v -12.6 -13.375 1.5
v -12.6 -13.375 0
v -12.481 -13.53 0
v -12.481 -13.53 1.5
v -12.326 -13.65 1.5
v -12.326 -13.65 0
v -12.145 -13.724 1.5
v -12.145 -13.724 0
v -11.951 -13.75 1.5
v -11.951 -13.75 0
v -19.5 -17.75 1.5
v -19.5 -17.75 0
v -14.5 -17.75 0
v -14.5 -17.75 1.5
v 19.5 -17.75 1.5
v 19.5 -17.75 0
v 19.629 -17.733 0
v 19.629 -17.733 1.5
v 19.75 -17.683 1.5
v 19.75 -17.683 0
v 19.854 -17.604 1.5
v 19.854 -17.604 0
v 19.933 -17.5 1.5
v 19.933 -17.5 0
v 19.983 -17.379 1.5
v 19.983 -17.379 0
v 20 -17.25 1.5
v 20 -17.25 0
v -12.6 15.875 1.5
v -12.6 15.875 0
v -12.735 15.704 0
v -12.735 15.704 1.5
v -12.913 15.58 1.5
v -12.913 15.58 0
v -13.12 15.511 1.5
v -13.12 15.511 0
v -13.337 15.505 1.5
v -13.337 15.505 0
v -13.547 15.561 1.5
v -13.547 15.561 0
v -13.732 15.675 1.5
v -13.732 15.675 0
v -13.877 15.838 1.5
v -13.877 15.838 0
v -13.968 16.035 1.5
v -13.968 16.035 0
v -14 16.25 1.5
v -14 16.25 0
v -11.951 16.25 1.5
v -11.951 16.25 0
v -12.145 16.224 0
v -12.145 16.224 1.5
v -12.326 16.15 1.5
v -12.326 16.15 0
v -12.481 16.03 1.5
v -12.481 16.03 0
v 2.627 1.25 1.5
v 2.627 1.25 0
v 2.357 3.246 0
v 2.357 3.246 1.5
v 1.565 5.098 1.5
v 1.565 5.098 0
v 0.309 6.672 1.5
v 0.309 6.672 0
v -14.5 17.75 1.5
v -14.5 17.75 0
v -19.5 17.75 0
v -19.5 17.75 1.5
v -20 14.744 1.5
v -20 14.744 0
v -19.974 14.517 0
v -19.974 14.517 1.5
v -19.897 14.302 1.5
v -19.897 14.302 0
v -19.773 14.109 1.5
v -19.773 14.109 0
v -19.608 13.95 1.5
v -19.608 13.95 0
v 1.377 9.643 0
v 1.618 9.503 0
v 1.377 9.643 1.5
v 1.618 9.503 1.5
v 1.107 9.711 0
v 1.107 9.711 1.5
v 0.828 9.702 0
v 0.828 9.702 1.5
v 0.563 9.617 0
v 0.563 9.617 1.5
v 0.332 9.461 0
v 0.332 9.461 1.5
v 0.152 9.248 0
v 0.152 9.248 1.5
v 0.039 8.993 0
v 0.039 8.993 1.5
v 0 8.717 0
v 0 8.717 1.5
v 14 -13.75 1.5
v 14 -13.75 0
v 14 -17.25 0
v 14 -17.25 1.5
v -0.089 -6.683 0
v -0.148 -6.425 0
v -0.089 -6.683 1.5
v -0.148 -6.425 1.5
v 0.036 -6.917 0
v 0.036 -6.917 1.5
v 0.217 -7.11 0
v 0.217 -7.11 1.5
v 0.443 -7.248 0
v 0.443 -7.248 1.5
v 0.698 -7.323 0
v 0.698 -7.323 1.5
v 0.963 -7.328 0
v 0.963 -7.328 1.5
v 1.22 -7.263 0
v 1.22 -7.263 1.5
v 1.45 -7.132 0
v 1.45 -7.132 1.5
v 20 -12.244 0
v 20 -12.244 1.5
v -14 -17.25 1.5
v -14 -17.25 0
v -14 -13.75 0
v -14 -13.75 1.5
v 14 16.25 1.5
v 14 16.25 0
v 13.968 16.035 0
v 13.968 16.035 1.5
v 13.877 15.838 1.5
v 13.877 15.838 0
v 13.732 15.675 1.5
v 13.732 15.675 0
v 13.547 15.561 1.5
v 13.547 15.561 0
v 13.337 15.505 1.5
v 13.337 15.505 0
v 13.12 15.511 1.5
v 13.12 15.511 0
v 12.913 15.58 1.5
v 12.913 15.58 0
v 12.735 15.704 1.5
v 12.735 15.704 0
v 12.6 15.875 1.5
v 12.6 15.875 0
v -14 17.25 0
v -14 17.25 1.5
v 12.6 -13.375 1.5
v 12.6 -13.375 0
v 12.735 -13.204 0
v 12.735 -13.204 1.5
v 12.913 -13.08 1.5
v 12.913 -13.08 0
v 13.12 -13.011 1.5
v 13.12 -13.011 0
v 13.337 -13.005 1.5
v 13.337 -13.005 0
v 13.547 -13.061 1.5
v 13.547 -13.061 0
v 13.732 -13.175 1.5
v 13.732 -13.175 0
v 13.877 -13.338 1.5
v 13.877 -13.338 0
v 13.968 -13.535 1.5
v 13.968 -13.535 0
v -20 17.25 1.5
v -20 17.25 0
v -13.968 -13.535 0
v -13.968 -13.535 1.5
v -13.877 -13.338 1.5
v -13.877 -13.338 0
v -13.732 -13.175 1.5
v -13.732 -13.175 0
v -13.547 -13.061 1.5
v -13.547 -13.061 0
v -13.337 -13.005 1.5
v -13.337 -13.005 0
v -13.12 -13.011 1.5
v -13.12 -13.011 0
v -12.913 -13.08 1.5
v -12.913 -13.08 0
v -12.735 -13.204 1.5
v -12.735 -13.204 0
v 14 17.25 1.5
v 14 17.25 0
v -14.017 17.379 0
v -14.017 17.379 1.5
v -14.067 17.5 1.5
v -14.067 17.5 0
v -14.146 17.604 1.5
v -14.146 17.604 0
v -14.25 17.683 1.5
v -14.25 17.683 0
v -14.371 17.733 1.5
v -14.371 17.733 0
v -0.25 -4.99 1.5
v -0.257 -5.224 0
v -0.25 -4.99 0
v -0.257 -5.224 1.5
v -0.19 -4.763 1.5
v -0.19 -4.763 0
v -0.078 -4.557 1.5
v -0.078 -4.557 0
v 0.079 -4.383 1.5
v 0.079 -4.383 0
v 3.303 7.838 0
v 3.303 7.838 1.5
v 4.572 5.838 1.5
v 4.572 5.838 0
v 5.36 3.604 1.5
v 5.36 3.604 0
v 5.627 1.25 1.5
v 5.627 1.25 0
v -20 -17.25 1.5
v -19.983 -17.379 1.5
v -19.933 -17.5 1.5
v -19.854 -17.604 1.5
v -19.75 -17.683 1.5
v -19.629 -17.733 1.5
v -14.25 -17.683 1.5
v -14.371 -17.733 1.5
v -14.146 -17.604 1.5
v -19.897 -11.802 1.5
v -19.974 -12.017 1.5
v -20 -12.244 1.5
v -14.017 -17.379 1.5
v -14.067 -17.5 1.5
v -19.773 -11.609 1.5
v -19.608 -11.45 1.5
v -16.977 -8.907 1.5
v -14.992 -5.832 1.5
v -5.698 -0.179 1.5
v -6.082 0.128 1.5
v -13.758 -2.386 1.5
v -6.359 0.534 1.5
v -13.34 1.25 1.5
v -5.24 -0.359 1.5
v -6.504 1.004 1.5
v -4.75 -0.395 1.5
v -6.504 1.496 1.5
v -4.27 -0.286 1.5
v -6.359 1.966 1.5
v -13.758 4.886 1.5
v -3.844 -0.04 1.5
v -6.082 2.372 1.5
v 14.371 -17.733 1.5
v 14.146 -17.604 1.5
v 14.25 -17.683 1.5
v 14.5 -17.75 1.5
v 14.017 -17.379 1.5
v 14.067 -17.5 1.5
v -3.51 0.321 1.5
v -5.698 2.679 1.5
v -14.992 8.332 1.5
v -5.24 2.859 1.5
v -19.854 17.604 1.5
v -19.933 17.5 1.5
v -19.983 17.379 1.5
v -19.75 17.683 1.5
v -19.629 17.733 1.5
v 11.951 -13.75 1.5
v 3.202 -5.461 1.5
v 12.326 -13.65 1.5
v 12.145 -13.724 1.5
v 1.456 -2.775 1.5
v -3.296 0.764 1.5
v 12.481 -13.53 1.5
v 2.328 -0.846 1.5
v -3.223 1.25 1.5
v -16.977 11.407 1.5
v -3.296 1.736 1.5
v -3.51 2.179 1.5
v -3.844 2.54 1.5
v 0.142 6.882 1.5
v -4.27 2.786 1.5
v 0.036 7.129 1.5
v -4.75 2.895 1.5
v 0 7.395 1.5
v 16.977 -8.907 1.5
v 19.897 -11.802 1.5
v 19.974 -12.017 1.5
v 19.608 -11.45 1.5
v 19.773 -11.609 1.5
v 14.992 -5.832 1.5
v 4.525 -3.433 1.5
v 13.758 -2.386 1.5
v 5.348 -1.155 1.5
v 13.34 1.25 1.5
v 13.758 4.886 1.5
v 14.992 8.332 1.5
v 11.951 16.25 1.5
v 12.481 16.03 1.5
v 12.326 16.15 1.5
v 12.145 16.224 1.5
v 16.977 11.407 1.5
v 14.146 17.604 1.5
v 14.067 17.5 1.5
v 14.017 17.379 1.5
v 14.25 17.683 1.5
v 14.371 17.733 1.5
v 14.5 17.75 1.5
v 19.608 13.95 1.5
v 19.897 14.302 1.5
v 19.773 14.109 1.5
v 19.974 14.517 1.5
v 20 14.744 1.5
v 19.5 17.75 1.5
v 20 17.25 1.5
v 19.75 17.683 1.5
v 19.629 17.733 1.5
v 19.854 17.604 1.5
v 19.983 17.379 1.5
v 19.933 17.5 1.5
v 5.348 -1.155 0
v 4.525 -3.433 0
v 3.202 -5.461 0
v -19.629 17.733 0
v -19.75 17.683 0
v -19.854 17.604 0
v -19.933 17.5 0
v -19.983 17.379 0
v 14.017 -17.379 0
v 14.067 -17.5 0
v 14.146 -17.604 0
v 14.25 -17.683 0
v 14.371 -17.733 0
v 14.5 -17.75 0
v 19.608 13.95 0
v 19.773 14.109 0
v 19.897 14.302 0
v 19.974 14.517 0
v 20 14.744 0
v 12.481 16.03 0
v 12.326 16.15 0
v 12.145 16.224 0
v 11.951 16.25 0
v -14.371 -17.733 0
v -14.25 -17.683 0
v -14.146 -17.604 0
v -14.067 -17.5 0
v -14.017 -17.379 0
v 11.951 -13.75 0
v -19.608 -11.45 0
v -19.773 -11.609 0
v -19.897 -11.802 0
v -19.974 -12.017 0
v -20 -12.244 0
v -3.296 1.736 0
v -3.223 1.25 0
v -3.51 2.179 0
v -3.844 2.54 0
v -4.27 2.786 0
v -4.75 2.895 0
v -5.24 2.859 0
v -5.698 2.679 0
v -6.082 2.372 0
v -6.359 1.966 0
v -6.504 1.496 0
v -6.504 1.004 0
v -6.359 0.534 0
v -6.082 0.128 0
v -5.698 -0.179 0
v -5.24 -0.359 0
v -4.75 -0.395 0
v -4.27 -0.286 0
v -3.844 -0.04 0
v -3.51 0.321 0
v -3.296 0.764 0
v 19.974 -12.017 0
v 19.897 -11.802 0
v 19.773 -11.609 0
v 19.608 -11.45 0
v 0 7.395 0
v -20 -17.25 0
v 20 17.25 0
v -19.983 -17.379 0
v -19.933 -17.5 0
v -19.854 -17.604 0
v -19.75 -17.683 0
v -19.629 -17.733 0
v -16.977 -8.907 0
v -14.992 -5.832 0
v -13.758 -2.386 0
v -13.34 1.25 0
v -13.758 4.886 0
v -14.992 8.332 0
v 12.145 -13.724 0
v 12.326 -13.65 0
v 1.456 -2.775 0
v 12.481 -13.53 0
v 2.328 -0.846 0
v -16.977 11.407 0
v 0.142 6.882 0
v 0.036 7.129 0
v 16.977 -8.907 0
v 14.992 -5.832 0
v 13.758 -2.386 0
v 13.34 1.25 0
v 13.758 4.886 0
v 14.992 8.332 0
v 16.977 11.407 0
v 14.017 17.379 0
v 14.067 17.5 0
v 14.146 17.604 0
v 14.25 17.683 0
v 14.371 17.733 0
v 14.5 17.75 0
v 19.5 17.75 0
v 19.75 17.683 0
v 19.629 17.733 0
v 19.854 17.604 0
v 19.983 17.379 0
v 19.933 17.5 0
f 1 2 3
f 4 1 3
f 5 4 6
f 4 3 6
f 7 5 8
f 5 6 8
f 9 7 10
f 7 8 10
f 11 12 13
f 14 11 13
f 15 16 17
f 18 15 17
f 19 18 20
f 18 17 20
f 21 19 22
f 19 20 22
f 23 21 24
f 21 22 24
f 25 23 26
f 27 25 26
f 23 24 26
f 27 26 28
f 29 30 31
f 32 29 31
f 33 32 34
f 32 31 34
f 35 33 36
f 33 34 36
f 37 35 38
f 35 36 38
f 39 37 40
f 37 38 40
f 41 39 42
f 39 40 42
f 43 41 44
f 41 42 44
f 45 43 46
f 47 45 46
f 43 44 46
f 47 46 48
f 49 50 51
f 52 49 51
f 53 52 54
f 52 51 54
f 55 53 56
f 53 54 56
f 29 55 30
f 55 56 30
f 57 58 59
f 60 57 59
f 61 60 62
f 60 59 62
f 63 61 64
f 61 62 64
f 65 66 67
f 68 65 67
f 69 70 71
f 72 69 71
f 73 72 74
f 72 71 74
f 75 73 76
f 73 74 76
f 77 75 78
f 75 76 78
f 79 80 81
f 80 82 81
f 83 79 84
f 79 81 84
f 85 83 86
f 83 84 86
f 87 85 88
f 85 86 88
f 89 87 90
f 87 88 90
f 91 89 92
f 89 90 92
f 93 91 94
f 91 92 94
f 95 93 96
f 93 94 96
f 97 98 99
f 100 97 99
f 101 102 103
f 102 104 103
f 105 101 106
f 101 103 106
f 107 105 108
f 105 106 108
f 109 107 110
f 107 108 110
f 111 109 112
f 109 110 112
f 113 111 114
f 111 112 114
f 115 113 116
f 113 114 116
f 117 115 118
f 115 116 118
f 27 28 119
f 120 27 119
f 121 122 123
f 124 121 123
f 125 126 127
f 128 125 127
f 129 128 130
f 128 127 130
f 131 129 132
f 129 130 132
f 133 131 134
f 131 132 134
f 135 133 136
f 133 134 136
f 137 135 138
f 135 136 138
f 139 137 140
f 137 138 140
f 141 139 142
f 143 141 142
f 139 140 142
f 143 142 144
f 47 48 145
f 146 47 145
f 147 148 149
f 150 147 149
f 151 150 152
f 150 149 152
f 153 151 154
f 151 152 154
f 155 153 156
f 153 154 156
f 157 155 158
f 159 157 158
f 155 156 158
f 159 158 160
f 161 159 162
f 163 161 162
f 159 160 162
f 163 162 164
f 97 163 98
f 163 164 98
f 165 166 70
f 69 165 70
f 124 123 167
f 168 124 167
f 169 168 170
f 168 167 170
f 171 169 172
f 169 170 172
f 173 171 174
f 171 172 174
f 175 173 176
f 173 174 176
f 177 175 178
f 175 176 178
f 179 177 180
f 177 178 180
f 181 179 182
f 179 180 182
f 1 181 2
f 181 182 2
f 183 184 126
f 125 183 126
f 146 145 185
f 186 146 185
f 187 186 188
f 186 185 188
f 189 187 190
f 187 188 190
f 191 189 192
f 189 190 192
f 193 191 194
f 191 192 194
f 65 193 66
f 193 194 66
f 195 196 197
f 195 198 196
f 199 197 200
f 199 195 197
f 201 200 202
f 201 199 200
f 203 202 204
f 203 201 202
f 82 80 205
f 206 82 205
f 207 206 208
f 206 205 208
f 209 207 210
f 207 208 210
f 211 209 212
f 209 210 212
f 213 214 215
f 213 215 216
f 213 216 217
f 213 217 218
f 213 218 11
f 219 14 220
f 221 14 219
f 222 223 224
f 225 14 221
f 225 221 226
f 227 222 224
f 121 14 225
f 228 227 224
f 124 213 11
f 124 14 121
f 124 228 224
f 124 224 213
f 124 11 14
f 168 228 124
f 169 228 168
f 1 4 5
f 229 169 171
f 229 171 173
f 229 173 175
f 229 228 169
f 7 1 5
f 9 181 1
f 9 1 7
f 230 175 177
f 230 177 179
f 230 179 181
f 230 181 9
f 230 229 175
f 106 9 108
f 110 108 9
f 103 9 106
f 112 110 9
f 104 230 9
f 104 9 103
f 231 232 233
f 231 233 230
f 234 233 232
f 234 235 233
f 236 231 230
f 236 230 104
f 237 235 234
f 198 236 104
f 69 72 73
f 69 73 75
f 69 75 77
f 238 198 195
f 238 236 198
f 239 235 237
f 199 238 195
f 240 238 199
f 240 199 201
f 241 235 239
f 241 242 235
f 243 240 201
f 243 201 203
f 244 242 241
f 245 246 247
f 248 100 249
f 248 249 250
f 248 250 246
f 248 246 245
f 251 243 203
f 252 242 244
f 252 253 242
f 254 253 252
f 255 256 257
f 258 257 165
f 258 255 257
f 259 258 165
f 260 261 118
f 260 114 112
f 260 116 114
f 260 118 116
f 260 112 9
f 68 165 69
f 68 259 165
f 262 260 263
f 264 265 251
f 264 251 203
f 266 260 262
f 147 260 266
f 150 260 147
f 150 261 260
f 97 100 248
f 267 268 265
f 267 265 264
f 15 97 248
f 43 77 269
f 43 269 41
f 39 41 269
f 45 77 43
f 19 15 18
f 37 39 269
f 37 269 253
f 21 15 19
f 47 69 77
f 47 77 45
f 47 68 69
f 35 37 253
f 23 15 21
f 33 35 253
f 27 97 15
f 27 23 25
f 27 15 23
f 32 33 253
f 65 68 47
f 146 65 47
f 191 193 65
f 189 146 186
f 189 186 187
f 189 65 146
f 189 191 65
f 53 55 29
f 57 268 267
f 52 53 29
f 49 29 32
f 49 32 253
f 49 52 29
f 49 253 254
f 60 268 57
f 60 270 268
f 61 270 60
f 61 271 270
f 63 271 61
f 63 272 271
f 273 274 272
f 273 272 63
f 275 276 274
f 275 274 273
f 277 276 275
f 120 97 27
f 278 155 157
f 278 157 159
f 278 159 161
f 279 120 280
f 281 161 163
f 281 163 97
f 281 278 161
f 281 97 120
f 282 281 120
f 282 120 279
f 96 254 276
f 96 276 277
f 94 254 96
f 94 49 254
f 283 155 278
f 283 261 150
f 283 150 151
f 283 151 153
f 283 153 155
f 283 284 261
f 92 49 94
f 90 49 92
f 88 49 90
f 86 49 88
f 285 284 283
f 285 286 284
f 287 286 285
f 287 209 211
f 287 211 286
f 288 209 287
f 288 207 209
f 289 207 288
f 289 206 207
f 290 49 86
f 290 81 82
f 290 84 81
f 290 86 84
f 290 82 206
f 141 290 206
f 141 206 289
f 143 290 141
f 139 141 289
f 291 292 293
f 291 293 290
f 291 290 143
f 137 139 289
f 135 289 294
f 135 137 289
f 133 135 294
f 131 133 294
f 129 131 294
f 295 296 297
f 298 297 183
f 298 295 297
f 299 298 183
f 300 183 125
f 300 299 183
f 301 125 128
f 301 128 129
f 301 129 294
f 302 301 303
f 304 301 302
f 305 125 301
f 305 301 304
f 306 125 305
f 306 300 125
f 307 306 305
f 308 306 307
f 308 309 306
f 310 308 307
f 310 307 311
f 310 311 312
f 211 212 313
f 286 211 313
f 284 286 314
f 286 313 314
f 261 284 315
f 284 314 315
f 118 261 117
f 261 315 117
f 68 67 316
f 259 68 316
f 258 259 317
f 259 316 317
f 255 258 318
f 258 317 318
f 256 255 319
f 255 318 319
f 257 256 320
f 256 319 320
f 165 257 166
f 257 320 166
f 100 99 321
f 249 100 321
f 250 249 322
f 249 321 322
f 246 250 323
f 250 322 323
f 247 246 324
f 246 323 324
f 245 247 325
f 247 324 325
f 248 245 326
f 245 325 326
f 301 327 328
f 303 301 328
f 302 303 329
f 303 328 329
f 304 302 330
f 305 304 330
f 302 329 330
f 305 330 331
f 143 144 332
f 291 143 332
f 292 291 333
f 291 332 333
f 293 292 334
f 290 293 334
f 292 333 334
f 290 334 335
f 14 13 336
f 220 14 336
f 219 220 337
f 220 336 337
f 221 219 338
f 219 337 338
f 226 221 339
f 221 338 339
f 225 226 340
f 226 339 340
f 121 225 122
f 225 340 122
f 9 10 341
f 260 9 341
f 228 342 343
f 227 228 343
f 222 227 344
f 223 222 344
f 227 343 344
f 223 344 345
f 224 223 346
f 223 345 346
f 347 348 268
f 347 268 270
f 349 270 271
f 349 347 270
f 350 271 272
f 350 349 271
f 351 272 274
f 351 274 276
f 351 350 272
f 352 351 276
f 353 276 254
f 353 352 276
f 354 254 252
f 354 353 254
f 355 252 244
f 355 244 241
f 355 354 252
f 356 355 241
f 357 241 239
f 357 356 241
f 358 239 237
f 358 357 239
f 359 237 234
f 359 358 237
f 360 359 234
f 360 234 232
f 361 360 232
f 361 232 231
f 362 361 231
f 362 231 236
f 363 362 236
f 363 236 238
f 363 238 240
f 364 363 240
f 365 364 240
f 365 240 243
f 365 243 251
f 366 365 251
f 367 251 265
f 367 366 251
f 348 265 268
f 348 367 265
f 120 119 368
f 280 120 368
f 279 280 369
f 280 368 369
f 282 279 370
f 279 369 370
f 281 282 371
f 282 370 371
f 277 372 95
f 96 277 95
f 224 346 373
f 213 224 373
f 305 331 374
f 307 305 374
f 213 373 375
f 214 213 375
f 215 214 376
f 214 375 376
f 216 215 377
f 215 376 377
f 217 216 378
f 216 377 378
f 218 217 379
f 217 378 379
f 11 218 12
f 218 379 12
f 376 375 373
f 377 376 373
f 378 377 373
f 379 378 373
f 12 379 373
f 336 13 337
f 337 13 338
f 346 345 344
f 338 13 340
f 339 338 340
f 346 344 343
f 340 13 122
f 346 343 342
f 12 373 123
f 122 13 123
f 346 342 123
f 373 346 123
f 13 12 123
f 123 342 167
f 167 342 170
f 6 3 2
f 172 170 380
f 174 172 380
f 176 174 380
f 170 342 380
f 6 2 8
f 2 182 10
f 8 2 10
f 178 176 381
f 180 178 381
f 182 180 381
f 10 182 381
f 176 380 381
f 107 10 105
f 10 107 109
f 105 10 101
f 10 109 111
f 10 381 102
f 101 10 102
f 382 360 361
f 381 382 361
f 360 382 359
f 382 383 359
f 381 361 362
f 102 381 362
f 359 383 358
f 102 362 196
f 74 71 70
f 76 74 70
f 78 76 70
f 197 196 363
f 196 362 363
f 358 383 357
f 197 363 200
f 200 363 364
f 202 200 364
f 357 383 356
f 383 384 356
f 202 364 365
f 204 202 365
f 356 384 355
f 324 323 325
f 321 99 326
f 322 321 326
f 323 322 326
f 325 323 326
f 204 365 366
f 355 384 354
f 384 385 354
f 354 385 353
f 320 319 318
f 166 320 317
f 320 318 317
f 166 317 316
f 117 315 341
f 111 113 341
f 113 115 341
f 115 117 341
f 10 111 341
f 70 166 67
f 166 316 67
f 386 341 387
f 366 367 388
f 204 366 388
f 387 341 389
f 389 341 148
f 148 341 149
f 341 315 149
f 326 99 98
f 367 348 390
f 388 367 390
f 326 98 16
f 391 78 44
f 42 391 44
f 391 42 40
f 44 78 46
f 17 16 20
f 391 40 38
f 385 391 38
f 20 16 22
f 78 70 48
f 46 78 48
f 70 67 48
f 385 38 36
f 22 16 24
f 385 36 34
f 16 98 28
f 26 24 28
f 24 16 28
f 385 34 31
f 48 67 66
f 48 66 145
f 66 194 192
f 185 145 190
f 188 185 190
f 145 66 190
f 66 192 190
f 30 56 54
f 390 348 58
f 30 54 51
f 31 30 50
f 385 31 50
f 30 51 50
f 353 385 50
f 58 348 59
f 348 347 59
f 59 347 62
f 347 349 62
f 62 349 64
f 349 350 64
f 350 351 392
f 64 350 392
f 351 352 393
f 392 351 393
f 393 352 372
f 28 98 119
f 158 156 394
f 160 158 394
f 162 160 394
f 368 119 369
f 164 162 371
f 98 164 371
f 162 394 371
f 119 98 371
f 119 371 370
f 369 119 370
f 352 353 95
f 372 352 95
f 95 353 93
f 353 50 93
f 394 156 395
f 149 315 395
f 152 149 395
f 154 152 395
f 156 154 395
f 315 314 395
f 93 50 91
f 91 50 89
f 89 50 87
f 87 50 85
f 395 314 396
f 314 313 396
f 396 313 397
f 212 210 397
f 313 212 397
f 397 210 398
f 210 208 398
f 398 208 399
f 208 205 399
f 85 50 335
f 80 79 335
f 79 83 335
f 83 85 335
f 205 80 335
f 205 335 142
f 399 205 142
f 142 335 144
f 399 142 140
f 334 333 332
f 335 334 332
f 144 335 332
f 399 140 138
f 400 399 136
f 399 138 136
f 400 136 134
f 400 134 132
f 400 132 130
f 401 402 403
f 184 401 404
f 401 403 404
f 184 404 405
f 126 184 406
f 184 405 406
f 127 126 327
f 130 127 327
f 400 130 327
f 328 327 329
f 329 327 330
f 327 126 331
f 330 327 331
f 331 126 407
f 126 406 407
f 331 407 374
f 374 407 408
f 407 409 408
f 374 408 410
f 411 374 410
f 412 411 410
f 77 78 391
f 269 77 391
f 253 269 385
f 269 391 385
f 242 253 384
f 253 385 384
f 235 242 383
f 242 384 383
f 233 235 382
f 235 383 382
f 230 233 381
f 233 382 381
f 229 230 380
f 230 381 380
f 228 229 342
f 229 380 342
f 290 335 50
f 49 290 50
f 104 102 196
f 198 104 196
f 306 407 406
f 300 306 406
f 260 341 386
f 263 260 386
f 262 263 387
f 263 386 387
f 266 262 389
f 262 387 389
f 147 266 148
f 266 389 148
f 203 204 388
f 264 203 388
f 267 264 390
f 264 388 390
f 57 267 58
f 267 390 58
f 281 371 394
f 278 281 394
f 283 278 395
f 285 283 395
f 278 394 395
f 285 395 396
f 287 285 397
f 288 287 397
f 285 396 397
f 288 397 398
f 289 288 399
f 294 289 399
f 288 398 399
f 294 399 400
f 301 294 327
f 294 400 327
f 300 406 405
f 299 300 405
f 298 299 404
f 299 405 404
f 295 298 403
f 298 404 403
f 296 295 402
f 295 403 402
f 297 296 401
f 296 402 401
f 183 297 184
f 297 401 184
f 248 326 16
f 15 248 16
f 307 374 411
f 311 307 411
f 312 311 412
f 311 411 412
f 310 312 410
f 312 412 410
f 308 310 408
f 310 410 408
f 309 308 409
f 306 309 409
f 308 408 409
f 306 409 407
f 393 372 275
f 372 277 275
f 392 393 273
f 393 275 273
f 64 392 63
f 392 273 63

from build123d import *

# Parameters (mm, degrees)
F0_R     = 1.65
F1_DEPTH = 1.5
F2_R     = 1


# Not quite as in the source:
# - ends of sketch curves that miss each other by under 0.0002 mm in the source are joined


with BuildPart() as f1:
    # F0 (on Top) → F1 (new body)
    with BuildSketch(Plane.XY):
        with BuildLine():
            ThreePointArc((19.6082164698, -11.4503983868), (13.339608, 1.2499996959), (19.608215987, 13.9503980169))
            ThreePointArc((19.608215987, 13.9503980169), (19.8967236619, 14.3015730303), (20.000004, 14.744172))
            Line((20.000004, 14.744172), (20.000004, 17.25))
            ThreePointArc((20.000004, 17.25), (19.8535573906, 17.6035533906), (19.500004, 17.75))
            Line((19.500004, 17.75), (14.500004, 17.75))
            ThreePointArc((14.500004, 17.75), (14.1464506094, 17.6035533906), (14.000004, 17.25))
            Line((14.000004, 17.25), (14.000004, 16.25))
            ThreePointArc((14.000004, 16.25), (13.4441182966, 15.5255556337), (12.6004849604, 15.8749999771))
            ThreePointArc((12.6004849604, 15.8749999771), (12.3259659886, 16.1495190594), (11.950966, 16.25))
            Line((11.950966, 16.25), (-11.950958, 16.25))
            ThreePointArc((-11.950958, 16.25), (-12.3259579886, 16.1495190594), (-12.6004770396, 15.8750000229))
            ThreePointArc((-12.6004770396, 15.8750000229), (-13.4441102966, 15.5255556337), (-13.999996, 16.25))
            Line((-13.999996, 16.25), (-13.999996, 17.25))
            ThreePointArc((-13.999996, 17.25), (-14.1464426094, 17.6035533906), (-14.499996, 17.75))
            Line((-14.499996, 17.75), (-19.499996, 17.75))
            ThreePointArc((-19.499996, 17.75), (-19.8535493906, 17.6035533906), (-19.999996, 17.25))
            Line((-19.999996, 17.25), (-19.999996, 14.744172))
            ThreePointArc((-19.999996, 14.744172), (-19.8967156619, 14.3015730303), (-19.6082083041, 13.9503976031))
            ThreePointArc((-19.6082083041, 13.9503976031), (-13.3396, 1.2499996959), (-19.6082084698, -11.4503983868))
            ThreePointArc((-19.6082084698, -11.4503983868), (-19.8967227718, -11.8015703601), (-20.000004, -12.244173))
            Line((-20.000004, -12.244173), (-19.999996, -17.25))
            ThreePointArc((-19.999996, -17.25), (-19.8535493906, -17.6035533906), (-19.499996, -17.75))
            Line((-19.499996, -17.75), (-14.499996, -17.75))
            ThreePointArc((-14.499996, -17.75), (-14.1464426094, -17.6035533906), (-13.999996, -17.25))
            Line((-13.999996, -17.25), (-13.999996, -13.75))
            ThreePointArc((-13.999996, -13.75), (-13.4441102966, -13.0255556337), (-12.6004769604, -13.3749999771))
            ThreePointArc((-12.6004769604, -13.3749999771), (-12.3259579886, -13.6495190594), (-11.950958, -13.75))
            Line((-11.950958, -13.75), (11.950966, -13.75))
            ThreePointArc((11.950966, -13.75), (12.3259659886, -13.6495190594), (12.6004850396, -13.3750000229))
            ThreePointArc((12.6004850396, -13.3750000229), (13.4441182966, -13.0255556337), (14.000004, -13.75))
            Line((14.000004, -13.75), (14.000004, -17.25))
            ThreePointArc((14.000004, -17.25), (14.1464506094, -17.6035533906), (14.500004, -17.75))
            Line((14.500004, -17.75), (19.500004, -17.75))
            ThreePointArc((19.500004, -17.75), (19.8535573906, -17.6035533906), (20.000004, -17.25))
            Line((20.000004, -17.25), (20.000004, -12.244173))
            ThreePointArc((20.000004, -12.244173), (19.8967236619, -11.8015740303), (19.6082164698, -11.4503983868))
        make_face()
        with Locations((-4.8728769961, 1.25)):
            Circle(F0_R, mode=Mode.SUBTRACT)
        with BuildLine():
            ThreePointArc((-0.3045548123, -4.6981452929), (1.8543964627, -2.0656887385), (2.6271230039, 1.25))
            ThreePointArc((2.6271230039, 1.25), (1.938751938, 4.3887435806), (0, 6.9513217574))
            Line((0, 6.9513217574), (0, 10.550810168))
            ThreePointArc((0, 10.550810168), (4.1108641083, 6.6852916914), (5.6271230039, 1.25))
            ThreePointArc((5.6271230039, 1.25), (4.1108641083, -4.1852916914), (0, -8.050810168))
            Line((0, -8.050810168), (-0.3045548123, -4.6981452929))
        make_face(mode=Mode.SUBTRACT)
    extrude(amount=F1_DEPTH)

    # F2
    f2_edges = [f1.edges().sort_by_distance(p)[0] for p in [
        (0, 10.55081, 0.75),
        (-0.304555, -4.698145, 0.75),
        (0, -8.05081, 0.75),
        (0, 6.951322, 0.75),
    ]]
    fillet(f2_edges, radius=F2_R)


solid = f1.part
